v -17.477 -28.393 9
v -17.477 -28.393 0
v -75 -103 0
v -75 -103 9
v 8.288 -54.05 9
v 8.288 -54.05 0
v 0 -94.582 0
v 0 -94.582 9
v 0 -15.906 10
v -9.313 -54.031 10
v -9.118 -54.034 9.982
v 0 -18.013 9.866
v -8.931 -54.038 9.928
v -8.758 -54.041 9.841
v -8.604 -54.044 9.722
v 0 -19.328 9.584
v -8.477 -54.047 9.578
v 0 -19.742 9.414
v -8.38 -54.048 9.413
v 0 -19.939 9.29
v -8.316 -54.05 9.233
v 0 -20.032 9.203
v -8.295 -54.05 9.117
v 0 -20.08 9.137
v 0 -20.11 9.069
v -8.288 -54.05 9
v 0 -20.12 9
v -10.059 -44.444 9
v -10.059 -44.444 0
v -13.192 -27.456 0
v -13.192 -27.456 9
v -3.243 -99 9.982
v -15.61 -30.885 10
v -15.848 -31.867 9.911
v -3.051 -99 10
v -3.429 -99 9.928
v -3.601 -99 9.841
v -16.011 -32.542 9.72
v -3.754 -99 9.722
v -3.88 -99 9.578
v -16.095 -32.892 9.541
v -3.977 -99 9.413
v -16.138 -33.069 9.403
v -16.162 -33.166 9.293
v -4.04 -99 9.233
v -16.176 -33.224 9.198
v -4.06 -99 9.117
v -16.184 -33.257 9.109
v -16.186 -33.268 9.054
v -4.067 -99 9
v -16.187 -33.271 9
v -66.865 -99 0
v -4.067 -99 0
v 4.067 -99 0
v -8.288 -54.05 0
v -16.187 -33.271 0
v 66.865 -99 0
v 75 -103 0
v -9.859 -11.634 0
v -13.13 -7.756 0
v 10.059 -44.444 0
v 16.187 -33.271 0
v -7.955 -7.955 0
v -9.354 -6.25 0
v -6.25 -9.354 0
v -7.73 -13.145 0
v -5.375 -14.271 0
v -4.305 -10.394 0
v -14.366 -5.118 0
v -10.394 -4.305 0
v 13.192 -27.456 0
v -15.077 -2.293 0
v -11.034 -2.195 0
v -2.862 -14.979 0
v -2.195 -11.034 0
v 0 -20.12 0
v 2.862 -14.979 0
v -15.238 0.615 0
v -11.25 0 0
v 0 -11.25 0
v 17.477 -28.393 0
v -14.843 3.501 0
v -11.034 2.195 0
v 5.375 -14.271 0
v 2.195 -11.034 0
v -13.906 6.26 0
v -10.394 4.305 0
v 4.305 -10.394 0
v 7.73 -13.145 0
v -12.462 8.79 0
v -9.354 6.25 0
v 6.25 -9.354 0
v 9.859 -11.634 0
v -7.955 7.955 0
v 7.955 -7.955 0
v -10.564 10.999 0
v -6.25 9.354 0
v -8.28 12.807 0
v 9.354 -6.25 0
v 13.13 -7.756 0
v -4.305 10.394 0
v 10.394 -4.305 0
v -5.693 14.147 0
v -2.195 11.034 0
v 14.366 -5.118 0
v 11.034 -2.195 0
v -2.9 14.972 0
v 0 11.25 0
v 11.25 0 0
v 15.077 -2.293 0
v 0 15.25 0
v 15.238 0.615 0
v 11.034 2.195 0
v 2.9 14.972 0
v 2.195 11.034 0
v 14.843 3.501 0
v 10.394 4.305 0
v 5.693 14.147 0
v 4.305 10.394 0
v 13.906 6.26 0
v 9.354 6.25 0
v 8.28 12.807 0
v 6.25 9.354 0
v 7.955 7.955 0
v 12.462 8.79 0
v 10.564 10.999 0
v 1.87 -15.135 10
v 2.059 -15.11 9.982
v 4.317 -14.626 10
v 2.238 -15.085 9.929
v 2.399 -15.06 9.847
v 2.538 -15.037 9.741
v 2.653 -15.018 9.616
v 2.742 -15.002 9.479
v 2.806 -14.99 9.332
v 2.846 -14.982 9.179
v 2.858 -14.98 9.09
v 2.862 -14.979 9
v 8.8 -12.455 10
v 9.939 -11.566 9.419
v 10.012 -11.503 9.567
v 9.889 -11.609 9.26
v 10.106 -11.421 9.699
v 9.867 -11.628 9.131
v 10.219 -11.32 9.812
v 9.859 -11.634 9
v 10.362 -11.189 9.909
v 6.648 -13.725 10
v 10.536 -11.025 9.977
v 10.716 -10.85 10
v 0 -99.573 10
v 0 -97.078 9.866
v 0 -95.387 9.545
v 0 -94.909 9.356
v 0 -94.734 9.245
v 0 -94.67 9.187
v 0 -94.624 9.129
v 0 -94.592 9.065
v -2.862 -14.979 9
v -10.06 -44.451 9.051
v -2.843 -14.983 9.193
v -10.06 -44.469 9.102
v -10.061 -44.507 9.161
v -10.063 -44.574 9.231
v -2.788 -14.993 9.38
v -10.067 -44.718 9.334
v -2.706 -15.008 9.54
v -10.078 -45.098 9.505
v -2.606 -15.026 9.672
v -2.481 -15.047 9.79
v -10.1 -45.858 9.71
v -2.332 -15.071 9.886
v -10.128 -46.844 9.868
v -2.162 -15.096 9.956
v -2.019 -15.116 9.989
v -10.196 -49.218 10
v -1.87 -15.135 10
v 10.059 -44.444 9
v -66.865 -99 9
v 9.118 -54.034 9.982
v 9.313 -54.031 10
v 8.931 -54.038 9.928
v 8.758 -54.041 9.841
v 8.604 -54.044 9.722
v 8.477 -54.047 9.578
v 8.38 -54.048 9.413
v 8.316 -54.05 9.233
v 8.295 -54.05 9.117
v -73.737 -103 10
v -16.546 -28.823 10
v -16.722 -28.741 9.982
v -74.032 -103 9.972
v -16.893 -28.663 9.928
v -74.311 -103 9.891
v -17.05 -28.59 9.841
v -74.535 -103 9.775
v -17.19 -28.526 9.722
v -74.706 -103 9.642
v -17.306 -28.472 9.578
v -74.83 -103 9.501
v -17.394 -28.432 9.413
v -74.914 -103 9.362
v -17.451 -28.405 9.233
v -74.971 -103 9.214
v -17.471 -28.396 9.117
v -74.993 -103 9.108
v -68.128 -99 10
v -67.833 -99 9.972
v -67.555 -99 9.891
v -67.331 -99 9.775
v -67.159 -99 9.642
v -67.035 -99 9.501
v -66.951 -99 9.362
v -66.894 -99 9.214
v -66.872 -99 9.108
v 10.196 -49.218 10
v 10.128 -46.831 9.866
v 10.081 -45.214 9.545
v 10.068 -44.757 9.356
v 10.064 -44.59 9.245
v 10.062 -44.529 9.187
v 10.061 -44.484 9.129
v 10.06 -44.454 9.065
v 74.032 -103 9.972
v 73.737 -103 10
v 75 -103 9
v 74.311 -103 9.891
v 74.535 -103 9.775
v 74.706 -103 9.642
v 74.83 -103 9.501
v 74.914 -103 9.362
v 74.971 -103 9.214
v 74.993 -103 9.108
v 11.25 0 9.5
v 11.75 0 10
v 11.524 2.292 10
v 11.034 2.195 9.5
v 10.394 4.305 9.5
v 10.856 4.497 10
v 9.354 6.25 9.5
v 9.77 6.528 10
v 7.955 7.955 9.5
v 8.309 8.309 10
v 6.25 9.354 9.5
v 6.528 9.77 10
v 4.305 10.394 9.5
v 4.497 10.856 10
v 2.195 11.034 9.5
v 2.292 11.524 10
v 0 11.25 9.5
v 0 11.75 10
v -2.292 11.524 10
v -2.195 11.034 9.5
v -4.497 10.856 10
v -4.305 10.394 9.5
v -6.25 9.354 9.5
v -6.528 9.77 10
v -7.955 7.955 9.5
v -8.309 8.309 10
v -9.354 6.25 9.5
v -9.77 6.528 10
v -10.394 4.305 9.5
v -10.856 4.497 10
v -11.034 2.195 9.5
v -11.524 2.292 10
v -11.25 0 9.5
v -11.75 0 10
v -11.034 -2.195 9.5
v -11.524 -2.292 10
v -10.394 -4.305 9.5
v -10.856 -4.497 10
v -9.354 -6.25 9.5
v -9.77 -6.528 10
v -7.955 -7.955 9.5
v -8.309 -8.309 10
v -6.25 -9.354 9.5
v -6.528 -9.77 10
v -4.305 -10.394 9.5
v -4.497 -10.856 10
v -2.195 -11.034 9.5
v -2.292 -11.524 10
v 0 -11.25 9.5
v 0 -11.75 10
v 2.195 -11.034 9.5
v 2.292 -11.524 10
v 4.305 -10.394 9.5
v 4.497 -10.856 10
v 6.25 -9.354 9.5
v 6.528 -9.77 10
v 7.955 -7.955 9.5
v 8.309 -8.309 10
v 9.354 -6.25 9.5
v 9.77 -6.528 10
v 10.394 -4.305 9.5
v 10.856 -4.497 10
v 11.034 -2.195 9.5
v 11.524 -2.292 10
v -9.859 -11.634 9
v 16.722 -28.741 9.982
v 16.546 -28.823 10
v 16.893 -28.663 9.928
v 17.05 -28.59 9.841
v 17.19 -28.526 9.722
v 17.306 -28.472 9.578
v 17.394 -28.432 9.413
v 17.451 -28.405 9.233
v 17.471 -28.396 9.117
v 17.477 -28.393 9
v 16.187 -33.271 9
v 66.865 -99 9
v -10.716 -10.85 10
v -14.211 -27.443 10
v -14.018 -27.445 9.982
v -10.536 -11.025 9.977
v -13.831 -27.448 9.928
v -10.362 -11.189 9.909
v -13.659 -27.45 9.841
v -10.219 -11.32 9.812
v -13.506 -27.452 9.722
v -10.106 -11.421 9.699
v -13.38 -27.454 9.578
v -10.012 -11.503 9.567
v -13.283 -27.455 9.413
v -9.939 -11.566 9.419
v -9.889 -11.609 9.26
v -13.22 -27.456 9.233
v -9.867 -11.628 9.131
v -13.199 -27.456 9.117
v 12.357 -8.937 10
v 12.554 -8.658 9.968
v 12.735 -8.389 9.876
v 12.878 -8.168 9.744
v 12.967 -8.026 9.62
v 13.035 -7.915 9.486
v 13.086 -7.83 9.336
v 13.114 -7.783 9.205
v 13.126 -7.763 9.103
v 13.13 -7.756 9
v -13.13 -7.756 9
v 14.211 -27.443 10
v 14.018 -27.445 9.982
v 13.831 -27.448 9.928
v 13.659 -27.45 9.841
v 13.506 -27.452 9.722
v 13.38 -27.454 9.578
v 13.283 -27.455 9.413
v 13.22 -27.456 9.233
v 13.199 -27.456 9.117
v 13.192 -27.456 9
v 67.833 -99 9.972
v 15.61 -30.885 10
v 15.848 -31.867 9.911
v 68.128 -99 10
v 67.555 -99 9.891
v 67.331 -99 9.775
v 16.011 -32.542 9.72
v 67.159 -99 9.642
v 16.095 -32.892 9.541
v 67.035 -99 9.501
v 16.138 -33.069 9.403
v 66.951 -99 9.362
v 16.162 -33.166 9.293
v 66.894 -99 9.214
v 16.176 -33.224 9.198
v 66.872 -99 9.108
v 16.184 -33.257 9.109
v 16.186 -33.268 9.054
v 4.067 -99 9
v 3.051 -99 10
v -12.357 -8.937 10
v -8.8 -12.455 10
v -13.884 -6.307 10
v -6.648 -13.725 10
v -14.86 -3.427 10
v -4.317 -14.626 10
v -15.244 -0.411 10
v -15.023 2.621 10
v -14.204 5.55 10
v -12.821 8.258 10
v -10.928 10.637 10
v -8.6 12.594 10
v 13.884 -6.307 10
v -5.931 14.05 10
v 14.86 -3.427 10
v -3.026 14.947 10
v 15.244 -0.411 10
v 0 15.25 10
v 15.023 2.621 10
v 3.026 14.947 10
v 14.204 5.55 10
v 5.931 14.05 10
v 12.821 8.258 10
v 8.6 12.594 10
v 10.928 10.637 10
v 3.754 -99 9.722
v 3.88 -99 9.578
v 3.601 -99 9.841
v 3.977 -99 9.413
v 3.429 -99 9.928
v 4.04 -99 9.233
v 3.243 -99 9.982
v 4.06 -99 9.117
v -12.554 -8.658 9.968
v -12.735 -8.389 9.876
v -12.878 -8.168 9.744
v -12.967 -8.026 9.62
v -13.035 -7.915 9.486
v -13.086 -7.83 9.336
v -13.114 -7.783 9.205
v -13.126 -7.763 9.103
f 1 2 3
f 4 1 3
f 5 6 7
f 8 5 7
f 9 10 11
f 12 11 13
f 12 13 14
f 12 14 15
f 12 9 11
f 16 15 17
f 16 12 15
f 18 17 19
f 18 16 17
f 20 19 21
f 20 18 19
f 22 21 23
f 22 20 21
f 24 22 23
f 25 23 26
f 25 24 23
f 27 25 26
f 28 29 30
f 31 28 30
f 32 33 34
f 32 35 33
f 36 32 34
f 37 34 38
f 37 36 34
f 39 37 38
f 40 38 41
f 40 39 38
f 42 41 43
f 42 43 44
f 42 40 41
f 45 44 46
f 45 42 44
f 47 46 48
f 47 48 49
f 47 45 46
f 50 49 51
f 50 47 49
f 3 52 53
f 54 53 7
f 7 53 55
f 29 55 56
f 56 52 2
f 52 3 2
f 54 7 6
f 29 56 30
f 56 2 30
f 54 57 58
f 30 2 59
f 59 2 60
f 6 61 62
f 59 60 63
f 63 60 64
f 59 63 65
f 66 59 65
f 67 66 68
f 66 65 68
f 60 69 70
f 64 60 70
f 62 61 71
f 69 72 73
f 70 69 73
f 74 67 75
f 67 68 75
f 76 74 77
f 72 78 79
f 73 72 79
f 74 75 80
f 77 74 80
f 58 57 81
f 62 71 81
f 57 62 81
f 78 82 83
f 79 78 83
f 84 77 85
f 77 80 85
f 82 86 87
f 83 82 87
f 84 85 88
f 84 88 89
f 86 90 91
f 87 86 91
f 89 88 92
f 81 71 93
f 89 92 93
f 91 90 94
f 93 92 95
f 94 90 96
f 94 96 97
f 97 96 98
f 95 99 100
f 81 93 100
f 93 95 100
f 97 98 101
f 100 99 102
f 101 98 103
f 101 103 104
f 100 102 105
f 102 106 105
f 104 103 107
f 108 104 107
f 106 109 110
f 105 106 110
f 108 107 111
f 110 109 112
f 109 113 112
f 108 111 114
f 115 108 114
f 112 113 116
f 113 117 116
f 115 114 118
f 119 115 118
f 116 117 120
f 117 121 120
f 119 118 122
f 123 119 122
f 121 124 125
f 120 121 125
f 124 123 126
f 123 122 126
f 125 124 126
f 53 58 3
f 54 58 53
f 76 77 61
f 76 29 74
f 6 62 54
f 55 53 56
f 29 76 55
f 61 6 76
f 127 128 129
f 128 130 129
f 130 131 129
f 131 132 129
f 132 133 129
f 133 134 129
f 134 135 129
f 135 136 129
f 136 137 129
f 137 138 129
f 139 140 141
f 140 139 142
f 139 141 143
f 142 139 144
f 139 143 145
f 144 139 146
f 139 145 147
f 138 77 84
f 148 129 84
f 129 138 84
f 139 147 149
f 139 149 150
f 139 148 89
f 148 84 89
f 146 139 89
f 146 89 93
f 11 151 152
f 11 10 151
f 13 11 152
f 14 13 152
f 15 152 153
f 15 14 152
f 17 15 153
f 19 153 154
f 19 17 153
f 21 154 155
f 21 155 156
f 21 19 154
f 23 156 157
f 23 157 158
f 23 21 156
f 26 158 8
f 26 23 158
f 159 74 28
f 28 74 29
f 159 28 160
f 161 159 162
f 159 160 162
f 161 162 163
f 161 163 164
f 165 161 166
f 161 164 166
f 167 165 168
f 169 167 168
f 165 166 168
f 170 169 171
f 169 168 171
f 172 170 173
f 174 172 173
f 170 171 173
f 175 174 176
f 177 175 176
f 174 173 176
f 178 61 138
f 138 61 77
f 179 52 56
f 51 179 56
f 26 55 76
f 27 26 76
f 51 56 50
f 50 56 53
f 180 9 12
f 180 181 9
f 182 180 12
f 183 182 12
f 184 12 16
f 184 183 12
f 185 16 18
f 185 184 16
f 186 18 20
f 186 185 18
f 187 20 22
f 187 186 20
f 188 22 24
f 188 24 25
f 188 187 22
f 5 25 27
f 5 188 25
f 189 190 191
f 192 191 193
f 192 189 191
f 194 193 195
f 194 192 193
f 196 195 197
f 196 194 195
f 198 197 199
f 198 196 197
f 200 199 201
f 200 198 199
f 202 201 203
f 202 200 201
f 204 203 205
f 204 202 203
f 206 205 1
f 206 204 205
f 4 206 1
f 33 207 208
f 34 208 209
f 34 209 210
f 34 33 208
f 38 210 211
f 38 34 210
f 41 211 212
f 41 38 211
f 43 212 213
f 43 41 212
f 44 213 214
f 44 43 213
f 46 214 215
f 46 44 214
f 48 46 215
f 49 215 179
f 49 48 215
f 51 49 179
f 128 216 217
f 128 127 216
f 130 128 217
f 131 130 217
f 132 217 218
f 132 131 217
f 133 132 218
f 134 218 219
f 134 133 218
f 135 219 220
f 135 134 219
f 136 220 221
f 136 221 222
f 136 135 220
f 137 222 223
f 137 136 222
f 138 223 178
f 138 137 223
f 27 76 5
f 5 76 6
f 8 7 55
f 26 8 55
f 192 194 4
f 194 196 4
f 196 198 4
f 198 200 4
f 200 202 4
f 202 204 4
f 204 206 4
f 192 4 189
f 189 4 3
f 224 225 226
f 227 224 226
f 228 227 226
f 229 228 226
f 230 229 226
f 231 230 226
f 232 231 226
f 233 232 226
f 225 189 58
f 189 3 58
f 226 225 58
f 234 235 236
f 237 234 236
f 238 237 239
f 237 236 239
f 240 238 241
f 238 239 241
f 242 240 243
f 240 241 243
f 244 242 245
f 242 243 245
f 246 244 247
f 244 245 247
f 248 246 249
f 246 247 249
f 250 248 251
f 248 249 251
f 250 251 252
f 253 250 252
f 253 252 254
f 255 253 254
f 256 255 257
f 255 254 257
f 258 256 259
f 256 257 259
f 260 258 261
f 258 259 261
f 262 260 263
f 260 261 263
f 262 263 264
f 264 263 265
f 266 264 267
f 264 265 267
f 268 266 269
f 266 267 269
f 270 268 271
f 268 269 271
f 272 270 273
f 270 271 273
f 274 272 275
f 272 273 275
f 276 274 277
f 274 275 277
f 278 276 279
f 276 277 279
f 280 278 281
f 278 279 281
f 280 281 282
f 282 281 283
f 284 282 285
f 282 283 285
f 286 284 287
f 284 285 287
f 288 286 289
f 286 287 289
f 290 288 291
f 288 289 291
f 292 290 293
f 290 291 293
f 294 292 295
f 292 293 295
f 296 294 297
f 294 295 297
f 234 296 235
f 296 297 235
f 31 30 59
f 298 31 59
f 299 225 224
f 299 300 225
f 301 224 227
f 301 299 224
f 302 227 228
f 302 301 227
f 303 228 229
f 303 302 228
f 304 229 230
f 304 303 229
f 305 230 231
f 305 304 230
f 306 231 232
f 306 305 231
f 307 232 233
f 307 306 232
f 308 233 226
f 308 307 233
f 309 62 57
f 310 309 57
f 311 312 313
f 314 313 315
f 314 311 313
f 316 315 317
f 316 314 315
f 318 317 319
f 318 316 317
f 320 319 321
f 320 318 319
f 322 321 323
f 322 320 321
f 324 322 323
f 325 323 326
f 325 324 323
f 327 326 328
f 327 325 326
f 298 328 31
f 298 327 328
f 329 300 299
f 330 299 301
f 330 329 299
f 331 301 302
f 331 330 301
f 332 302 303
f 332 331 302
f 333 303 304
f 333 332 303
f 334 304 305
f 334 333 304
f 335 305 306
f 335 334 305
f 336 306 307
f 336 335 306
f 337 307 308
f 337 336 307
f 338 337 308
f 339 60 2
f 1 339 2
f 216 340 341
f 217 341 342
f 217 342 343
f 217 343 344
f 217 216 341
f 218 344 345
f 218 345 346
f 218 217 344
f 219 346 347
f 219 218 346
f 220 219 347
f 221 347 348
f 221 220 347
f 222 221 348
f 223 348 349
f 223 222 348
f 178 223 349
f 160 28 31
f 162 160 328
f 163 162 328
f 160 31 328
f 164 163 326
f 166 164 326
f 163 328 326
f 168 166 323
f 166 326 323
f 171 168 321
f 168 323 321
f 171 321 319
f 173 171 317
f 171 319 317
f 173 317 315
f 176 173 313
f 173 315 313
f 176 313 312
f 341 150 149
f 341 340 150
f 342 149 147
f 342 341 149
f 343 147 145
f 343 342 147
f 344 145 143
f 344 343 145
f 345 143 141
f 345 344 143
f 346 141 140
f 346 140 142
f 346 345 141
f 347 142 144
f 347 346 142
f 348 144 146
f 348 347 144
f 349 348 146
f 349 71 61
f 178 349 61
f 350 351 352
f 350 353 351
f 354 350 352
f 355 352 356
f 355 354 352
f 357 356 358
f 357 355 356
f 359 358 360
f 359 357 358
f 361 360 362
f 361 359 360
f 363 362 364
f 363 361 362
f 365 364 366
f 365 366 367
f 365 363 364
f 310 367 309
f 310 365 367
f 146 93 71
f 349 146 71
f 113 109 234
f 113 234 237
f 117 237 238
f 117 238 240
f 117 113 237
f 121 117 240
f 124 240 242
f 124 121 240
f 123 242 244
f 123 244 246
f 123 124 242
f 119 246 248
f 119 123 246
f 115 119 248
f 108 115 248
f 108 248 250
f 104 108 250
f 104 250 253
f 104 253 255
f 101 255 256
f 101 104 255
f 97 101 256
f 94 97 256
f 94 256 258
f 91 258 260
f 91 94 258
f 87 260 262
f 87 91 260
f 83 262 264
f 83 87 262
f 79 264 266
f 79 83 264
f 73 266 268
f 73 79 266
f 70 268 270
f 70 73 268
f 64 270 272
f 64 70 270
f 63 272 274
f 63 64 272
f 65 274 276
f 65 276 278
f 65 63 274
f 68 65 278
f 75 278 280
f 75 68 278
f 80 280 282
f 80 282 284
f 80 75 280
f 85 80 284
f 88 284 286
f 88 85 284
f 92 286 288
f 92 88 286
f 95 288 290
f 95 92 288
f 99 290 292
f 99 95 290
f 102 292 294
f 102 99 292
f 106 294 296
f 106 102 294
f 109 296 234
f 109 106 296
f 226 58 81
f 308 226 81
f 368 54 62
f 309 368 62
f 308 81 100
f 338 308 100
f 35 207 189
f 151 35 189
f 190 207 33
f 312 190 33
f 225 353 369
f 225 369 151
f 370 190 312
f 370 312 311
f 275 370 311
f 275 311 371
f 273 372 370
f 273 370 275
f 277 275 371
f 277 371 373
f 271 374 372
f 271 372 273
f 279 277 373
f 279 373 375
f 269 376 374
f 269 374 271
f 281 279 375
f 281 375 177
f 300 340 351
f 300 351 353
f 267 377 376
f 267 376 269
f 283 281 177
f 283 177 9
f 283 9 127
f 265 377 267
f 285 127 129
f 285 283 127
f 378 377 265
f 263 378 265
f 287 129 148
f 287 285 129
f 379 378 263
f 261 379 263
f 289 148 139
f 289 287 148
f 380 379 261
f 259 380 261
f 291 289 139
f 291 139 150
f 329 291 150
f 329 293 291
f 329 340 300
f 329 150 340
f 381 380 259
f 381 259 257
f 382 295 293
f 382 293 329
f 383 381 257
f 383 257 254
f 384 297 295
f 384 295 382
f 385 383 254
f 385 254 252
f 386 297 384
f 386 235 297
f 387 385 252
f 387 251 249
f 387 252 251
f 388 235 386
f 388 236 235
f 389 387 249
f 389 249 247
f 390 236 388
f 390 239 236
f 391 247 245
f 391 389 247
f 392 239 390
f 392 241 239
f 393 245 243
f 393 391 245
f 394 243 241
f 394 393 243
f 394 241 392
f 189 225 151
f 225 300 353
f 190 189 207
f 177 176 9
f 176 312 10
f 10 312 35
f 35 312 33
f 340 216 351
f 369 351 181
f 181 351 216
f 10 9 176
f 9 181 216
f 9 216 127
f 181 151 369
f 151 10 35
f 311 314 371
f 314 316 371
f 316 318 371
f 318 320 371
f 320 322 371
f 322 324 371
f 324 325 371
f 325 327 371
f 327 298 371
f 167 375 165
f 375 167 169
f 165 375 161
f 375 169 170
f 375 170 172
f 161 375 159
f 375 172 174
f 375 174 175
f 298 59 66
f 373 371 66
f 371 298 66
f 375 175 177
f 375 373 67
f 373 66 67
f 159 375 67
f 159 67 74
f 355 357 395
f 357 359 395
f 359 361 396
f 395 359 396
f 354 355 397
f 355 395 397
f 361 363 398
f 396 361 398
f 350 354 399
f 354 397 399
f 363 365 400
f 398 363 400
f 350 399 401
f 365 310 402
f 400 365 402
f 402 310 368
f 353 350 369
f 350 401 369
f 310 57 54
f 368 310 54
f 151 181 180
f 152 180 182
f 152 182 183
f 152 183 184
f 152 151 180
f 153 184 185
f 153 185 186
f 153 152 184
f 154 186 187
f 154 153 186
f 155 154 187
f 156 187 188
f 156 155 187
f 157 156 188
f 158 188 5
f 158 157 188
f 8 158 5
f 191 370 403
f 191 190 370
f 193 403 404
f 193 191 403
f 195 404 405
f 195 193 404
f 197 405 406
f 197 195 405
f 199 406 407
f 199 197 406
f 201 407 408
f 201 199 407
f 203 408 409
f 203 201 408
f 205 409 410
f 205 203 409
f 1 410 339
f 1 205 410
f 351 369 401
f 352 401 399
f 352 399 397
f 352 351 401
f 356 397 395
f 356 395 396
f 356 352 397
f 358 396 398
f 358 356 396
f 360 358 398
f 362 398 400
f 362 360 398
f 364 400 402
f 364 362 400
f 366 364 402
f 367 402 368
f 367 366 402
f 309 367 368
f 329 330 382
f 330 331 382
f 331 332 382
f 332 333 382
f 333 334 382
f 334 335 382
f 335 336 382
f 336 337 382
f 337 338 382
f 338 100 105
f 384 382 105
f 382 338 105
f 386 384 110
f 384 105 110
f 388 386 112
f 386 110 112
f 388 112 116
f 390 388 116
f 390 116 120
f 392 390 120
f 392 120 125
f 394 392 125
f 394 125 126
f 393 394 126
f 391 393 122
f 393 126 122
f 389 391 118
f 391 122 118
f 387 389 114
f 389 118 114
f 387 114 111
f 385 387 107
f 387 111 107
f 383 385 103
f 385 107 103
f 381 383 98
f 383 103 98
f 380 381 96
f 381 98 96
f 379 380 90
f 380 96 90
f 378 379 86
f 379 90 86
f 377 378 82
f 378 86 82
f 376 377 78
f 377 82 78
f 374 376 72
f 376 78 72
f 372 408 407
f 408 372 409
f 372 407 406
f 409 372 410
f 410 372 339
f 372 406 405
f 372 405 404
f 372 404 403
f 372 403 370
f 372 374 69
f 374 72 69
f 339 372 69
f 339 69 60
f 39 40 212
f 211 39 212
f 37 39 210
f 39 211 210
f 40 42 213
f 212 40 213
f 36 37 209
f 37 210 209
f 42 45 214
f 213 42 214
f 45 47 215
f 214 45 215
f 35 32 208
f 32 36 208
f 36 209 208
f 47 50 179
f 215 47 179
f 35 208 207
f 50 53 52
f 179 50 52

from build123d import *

# Parameters (mm, degrees)
F0_R     = 11.25
F1_DEPTH = 10
F2_DEPTH = 7.1
F3_R     = 1
F5_SIZE  = 0.5


# Not quite as in the source:
# - two fillets or chamfers of one size are made in one step
# - a feature names something its author has since deleted; it is built from what else it names


with BuildPart() as f1:
    # F0 (on Top) → F1 (new body)
    with BuildSketch(Plane.XY):
        with BuildLine():
            ThreePointArc((-2.8618452925, -14.9790634394), (0, -15.25), (2.8618452925, -14.9790634394))
            ThreePointArc((2.8618452925, -14.9790634394), (6.5768557716, -13.7589050494), (9.8594632948, -11.6341516037))
            ThreePointArc((9.8594632948, -11.6341516037), (11.6573360398, -9.8320402997), (13.1303972918, -7.7559762093))
            ThreePointArc((13.1303972918, -7.7559762093), (0, 15.25), (-13.1303972918, -7.7559762093))
            ThreePointArc((-13.1303972918, -7.7559762093), (-11.6573360398, -9.8320402997), (-9.8594632948, -11.6341516037))
            ThreePointArc((-9.8594632948, -11.6341516037), (-6.5768557716, -13.7589050494), (-2.8618452925, -14.9790634394))
        make_face()
        Circle(F0_R, mode=Mode.SUBTRACT)
        with BuildLine():
            Line((10.0593915347, -44.4443559719), (2.8618452925, -14.9790634394))
            ThreePointArc((2.8618452925, -14.9790634394), (0, -15.25), (-2.8618452925, -14.9790634394))
            Line((-2.8618452925, -14.9790634394), (-10.0593915347, -44.4443559719))
            Line((-10.0593915347, -44.4443559719), (-13.1918562915, -27.455889859))
            Line((-13.1918562915, -27.455889859), (-9.8594632948, -11.6341516037))
            ThreePointArc((-9.8594632948, -11.6341516037), (-11.6573360398, -9.8320402997), (-13.1303972918, -7.7559762093))
            Line((-13.1303972918, -7.7559762093), (-17.4770367352, -28.3932154638))
            Line((-17.4770367352, -28.3932154638), (-75, -103))
            Line((-75, -103), (75, -103))
            Line((75, -103), (17.4770367352, -28.3932154638))
            Line((17.4770367352, -28.3932154638), (13.1303972918, -7.7559762093))
            ThreePointArc((13.1303972918, -7.7559762093), (11.6573360398, -9.8320402997), (9.8594632948, -11.6341516037))
            Line((9.8594632948, -11.6341516037), (13.1918562915, -27.455889859))
            Line((13.1918562915, -27.455889859), (10.0593915347, -44.4443559719))
        make_face()
        Polygon((-66.8650551594, -99), (-16.187040587, -33.2710545609), (-4.0674293329, -99), align=None, mode=Mode.SUBTRACT)
        Polygon((66.8650551594, -99), (4.0674293329, -99), (16.187040587, -33.2710545609), align=None, mode=Mode.SUBTRACT)
        Polygon((-8.2882046257, -54.0501300567), (0, -20.1199036092), (8.2882046257, -54.0501300567), (0, -94.5818126202), align=None, mode=Mode.SUBTRACT)
    extrude(amount=F1_DEPTH)

    # F0 (on Top) → F2 (join)
    with BuildSketch(Plane.XY):
        with BuildLine():
            ThreePointArc((-2.8618452925, -14.9790634394), (0, -15.25), (2.8618452925, -14.9790634394))
            ThreePointArc((2.8618452925, -14.9790634394), (6.5768557716, -13.7589050494), (9.8594632948, -11.6341516037))
            ThreePointArc((9.8594632948, -11.6341516037), (11.6573360398, -9.8320402997), (13.1303972918, -7.7559762093))
            ThreePointArc((13.1303972918, -7.7559762093), (0, 15.25), (-13.1303972918, -7.7559762093))
            ThreePointArc((-13.1303972918, -7.7559762093), (-11.6573360398, -9.8320402997), (-9.8594632948, -11.6341516037))
            ThreePointArc((-9.8594632948, -11.6341516037), (-6.5768557716, -13.7589050494), (-2.8618452925, -14.9790634394))
        make_face()
        Circle(F0_R, mode=Mode.SUBTRACT)
    extrude(amount=F2_DEPTH)

    # F3
    f3_edges = [f1.edges().sort_by_distance(p)[0] for p in [
        (-15.303717, -18.074596, 10),
        (-11.52566, -19.545021, 10),
        (-11.625624, -35.950123, 10),
        (-46.238518, -65.696608, 10),
        (-41.526048, -66.135527, 10),
        (-10.127235, -66.135527, 10),
        (-6.460618, -29.71171, 10),
        (6.460618, -29.71171, 10),
        (11.52566, -19.545021, 10),
        (11.625624, -35.950123, 10),
        (15.303717, -18.074596, 10),
        (46.238518, -65.696608, 10),
        (41.526048, -66.135527, 10),
        (10.127235, -66.135527, 10),
        (-4.144102, -37.085017, 10),
        (-4.144102, -74.315971, 10),
        (4.144102, -74.315971, 10),
        (4.144102, -37.085017, 10),
    ]]
    fillet(f3_edges, radius=F3_R)

    # F5
    f5_edges = [f1.edges().sort_by_distance(p)[0] for p in [
        (-11.25, 0, 10),
    ]]
    chamfer(f5_edges, length=F5_SIZE)


solid = f1.part
